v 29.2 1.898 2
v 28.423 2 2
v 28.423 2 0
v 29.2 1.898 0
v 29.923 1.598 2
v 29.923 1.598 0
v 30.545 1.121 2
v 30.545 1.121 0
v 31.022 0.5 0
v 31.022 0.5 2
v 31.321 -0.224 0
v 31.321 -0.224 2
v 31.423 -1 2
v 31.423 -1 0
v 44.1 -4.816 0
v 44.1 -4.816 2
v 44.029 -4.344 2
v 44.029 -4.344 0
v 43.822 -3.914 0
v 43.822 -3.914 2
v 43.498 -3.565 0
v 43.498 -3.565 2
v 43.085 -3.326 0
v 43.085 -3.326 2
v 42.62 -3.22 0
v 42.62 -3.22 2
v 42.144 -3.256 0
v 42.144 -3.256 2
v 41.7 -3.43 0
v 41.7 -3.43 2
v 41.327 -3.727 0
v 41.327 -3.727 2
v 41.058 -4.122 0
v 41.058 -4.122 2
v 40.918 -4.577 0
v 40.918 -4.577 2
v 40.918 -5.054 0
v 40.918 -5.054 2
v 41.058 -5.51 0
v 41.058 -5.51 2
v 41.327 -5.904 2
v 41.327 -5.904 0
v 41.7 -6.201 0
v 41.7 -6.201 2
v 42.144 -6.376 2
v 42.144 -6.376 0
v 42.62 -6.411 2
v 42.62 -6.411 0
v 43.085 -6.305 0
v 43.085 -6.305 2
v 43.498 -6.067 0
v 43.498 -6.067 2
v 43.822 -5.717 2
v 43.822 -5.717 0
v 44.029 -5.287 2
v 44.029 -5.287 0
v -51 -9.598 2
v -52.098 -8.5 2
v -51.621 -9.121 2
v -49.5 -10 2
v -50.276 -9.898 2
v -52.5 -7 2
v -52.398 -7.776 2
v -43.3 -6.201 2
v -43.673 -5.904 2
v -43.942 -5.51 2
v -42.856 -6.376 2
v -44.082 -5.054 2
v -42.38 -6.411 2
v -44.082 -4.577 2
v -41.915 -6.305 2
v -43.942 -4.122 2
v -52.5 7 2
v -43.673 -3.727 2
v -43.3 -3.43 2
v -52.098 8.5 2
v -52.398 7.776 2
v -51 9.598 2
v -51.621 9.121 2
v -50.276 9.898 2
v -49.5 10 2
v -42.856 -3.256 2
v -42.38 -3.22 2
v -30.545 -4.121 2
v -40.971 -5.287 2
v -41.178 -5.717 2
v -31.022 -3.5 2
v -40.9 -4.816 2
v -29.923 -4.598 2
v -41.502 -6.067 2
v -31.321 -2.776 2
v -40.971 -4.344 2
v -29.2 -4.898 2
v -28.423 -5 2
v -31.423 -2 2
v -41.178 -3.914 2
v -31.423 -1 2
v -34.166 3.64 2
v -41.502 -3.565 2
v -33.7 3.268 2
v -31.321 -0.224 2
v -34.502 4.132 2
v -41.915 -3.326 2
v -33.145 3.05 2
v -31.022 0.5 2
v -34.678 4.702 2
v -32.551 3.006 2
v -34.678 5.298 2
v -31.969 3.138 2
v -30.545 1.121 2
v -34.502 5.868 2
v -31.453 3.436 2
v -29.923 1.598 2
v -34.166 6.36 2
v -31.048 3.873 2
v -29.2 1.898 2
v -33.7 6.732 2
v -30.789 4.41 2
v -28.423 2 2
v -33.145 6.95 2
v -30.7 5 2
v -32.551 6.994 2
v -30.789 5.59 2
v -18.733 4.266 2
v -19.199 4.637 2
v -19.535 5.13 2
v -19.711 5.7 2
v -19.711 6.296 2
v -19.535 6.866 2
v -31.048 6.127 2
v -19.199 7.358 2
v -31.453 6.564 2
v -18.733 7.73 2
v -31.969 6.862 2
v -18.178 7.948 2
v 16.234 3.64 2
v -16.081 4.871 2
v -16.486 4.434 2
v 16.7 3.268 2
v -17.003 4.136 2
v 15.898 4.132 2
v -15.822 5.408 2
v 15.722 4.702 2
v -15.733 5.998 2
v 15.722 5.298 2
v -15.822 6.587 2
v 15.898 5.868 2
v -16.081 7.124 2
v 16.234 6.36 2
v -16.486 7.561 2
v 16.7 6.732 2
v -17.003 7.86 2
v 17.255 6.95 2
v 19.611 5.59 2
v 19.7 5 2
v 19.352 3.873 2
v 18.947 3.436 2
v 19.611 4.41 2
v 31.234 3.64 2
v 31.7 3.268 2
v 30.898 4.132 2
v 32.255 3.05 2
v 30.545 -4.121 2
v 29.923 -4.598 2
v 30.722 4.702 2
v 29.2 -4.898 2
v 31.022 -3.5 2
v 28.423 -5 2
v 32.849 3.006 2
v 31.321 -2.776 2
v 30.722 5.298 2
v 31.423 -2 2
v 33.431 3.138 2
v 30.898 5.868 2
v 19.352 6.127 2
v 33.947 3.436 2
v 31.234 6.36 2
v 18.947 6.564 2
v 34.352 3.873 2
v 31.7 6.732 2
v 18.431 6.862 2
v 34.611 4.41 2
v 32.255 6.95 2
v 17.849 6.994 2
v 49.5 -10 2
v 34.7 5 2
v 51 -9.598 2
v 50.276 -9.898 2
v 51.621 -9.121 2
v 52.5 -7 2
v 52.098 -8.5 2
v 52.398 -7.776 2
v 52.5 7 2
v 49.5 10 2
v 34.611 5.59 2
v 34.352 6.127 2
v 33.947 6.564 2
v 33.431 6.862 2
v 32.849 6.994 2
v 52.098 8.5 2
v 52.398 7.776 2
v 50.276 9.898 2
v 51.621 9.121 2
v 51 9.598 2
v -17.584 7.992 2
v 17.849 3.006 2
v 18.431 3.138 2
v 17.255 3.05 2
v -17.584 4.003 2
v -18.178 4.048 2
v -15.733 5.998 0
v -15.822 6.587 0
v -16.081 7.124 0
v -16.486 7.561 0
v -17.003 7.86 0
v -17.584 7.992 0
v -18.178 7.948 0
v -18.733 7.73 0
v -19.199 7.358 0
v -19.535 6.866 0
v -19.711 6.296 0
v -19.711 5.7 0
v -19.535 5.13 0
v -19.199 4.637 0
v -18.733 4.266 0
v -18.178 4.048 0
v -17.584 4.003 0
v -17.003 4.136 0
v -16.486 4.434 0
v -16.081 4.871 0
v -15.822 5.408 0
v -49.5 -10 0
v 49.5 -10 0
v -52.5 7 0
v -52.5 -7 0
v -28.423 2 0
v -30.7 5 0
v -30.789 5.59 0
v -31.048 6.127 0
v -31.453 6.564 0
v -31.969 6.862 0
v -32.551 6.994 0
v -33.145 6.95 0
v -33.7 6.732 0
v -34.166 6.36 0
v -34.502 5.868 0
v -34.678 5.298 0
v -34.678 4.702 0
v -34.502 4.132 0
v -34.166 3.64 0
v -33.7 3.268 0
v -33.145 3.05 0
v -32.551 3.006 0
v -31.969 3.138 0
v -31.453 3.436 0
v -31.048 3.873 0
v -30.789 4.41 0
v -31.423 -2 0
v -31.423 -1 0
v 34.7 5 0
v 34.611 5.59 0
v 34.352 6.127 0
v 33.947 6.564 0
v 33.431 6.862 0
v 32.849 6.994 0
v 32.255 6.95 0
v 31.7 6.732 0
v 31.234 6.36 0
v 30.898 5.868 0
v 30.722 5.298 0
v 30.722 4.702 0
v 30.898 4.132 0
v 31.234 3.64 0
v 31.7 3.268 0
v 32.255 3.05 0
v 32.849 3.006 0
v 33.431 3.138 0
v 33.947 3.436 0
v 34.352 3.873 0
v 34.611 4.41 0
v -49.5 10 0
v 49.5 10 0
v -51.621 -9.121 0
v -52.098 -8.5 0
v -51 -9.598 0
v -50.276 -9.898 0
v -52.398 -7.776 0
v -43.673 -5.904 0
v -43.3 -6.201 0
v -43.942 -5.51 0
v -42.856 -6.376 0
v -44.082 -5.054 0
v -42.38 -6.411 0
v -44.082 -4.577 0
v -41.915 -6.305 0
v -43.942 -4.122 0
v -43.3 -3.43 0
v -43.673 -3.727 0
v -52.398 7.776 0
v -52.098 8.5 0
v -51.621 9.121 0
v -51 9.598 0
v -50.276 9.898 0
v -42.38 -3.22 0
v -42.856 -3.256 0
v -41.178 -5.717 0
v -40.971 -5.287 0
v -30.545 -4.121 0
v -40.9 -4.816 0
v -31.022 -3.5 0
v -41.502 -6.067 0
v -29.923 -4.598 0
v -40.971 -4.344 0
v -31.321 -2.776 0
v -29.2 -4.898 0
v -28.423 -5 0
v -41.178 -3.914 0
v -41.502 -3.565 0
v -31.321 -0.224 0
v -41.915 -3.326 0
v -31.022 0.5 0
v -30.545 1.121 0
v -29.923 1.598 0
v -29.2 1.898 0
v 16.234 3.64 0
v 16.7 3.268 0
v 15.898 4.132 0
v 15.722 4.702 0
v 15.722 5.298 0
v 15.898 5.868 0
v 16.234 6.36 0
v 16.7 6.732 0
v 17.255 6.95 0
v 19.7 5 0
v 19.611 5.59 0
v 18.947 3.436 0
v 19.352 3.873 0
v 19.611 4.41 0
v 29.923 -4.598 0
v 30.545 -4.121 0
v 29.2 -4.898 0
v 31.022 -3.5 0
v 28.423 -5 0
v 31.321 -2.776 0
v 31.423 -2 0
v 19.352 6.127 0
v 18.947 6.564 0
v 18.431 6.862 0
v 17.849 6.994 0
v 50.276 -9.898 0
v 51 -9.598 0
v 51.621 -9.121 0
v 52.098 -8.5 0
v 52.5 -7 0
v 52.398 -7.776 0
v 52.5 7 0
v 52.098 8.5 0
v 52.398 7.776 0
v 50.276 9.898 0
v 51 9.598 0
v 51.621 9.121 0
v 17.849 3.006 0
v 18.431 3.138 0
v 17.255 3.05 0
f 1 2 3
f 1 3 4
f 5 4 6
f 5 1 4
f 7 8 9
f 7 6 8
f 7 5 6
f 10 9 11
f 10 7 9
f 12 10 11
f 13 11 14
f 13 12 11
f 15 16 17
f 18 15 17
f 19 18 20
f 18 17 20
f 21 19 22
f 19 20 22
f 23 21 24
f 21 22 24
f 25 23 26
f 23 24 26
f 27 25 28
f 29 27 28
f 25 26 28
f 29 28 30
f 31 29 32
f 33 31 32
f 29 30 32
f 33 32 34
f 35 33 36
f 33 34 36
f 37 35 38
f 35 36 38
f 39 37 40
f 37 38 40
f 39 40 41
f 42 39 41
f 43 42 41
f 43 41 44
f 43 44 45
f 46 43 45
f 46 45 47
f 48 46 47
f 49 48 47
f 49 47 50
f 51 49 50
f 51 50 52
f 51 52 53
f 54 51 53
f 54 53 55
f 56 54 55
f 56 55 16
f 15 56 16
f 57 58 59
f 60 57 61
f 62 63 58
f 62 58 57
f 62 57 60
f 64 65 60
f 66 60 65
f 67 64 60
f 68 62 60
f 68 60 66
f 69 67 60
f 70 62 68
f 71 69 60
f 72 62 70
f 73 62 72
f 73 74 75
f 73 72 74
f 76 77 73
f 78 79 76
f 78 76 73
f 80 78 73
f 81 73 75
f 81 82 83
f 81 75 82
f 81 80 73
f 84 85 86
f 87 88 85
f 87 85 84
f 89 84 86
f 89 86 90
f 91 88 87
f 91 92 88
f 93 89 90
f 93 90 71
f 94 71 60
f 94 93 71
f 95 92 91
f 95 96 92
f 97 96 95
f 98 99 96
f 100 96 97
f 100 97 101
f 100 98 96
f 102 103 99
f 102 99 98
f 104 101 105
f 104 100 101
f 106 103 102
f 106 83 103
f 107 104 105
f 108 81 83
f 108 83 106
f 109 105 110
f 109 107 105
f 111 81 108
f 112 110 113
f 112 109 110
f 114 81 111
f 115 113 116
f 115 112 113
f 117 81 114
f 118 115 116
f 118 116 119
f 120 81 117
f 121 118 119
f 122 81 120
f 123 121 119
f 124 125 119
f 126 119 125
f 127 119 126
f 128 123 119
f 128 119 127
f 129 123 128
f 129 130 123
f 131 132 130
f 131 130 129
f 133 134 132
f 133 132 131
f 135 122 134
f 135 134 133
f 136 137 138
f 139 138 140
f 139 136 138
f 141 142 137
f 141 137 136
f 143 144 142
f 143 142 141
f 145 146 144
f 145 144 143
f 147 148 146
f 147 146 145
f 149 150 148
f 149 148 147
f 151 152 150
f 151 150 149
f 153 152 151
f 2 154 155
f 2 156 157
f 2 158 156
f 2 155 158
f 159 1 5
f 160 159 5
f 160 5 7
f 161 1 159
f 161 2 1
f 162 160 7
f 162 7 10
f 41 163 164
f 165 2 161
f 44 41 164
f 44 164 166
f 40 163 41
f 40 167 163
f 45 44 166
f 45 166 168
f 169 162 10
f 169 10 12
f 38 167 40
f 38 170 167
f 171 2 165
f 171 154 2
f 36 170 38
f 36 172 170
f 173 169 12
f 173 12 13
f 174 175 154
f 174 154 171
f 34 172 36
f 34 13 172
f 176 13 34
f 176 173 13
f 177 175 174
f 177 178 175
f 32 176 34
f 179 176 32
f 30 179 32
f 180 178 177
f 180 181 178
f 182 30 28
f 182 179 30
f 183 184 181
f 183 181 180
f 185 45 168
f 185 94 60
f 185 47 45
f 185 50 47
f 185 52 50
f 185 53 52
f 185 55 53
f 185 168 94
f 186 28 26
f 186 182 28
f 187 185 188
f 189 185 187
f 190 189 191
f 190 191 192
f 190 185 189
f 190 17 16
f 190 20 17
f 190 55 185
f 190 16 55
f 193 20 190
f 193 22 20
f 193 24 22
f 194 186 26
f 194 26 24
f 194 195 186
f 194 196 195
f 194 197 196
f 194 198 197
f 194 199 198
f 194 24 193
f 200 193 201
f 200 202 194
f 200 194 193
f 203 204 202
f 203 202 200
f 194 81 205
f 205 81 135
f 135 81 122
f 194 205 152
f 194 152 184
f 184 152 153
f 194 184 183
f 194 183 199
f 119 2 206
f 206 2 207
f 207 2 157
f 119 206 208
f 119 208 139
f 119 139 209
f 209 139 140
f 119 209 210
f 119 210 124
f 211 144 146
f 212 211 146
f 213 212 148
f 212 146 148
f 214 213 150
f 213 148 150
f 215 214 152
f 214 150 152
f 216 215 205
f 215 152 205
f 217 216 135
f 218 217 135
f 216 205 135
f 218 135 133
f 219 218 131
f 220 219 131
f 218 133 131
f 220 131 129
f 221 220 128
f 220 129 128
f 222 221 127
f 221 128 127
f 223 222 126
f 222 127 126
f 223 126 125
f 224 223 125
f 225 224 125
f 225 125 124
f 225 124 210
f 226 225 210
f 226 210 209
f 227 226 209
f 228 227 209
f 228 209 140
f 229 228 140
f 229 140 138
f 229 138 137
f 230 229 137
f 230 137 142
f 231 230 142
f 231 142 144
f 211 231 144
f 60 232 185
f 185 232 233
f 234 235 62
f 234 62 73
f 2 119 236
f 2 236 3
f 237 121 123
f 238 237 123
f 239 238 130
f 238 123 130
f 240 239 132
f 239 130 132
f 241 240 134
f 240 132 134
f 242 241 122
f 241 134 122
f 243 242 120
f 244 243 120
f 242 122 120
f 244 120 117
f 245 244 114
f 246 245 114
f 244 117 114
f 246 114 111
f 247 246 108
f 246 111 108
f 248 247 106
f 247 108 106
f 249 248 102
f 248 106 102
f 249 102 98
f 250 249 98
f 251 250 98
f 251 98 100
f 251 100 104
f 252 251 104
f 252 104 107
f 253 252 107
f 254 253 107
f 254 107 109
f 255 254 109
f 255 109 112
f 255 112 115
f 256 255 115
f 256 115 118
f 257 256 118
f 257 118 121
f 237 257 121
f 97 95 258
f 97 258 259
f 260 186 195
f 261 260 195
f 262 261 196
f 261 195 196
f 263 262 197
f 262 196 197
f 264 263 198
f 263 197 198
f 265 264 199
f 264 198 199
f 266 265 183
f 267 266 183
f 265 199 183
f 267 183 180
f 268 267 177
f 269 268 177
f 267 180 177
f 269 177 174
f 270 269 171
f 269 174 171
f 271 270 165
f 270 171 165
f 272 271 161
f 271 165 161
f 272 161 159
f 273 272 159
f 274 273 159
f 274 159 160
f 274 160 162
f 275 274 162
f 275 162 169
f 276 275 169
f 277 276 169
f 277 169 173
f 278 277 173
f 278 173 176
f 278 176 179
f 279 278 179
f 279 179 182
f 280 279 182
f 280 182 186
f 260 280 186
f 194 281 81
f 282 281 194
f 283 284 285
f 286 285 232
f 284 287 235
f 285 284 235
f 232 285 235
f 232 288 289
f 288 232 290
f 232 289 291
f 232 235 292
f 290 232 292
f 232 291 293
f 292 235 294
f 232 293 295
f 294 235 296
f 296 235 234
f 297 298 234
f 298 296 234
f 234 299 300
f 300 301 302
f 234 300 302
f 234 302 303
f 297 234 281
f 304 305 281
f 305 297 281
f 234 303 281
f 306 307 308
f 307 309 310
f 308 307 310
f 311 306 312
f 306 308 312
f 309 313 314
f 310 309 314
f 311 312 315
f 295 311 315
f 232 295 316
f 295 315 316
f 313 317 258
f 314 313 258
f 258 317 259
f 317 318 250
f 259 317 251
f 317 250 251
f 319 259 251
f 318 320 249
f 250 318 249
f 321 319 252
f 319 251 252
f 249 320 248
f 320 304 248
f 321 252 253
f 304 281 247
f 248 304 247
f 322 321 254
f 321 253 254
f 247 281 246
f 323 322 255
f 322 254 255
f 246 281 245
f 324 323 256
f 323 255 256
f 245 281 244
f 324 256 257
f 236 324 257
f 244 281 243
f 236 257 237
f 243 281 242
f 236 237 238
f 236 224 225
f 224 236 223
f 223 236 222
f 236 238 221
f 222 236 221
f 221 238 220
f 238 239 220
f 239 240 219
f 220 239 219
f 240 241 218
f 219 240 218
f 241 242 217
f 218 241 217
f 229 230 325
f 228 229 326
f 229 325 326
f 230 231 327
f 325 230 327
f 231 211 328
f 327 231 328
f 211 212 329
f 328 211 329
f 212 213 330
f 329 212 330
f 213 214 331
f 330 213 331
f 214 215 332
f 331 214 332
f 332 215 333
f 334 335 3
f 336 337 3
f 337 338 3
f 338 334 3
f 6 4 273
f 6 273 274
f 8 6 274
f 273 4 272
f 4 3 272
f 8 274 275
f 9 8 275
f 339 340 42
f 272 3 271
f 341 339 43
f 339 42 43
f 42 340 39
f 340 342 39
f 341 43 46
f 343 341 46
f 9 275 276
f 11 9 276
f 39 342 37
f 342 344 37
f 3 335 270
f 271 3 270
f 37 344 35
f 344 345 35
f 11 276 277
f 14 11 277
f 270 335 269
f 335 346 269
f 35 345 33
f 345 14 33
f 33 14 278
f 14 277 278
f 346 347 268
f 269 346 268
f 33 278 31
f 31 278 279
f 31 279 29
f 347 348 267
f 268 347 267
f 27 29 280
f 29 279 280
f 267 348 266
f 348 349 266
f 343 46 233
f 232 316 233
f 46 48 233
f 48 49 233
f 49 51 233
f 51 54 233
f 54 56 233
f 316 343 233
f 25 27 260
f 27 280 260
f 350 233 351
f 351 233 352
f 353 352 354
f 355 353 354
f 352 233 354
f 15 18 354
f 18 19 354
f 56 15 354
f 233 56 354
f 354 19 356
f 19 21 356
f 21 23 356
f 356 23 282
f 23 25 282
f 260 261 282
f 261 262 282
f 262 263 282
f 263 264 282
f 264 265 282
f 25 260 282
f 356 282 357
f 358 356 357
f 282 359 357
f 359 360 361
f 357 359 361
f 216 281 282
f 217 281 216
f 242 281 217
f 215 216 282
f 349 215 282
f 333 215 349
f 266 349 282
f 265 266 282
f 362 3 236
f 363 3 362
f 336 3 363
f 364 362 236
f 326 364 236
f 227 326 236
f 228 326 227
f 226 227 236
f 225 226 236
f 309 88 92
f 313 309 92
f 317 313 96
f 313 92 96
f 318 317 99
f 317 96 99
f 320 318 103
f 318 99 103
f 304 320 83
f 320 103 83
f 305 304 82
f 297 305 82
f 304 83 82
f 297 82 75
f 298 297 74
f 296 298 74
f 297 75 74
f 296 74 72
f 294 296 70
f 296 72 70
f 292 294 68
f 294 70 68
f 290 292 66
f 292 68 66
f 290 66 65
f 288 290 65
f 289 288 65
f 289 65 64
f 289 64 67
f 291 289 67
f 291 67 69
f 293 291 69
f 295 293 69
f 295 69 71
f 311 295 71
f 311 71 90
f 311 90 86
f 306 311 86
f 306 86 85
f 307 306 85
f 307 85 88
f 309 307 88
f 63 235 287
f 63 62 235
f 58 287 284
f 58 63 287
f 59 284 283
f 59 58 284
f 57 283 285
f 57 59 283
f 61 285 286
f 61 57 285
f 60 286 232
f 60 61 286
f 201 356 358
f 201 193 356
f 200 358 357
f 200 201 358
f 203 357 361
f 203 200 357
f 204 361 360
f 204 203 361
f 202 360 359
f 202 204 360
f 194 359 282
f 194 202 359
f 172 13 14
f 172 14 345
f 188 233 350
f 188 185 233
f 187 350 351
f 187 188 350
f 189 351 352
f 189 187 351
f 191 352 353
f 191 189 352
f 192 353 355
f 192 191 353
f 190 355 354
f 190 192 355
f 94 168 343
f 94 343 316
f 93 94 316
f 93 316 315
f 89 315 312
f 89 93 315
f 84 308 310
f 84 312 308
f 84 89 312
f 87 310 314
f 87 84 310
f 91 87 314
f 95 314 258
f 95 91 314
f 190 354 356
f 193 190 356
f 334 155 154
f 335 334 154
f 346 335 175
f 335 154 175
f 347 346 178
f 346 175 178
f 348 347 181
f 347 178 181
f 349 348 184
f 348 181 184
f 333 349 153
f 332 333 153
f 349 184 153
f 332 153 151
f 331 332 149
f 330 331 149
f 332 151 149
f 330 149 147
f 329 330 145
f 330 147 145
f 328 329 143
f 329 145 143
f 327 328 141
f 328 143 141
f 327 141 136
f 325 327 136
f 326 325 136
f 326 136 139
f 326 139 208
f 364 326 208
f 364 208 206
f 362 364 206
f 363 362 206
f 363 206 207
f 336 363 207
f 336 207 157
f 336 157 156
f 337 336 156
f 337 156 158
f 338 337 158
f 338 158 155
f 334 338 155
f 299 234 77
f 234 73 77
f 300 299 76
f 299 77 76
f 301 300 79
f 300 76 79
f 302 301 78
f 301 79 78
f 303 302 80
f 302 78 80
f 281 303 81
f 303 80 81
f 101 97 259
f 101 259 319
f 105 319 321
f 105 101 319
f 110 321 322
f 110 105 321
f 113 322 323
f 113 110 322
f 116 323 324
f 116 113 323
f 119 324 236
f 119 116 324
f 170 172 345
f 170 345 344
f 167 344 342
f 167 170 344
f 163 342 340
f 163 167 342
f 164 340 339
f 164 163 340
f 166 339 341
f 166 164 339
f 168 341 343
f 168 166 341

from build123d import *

# Parameters (mm, degrees)
SKETCH_1_W          = 105
SKETCH_1_H          = 20
EXTRUDE_1_DEPTH     = 2
FILLET_1_R          = 3
SKETCH_2_R          = 2
SKETCH_2_R_2        = 1.6
CUT_EXTRUDE_1_DEPTH = 3


with BuildPart() as part:
    # 草图1 → 凸台-拉伸1 (new body)
    with BuildSketch(Plane.XY):
        Rectangle(SKETCH_1_W, SKETCH_1_H)
    extrude(amount=EXTRUDE_1_DEPTH)

    # 圆角1
    fillet_1_edges = [part.edges().sort_by_distance(p)[0] for p in [
        (52.5, -10, 1),
        (-52.5, -10, 1),
        (-52.5, 10, 1),
        (52.5, 10, 1),
    ]]
    fillet(fillet_1_edges, radius=FILLET_1_R)

    # 草图2 → 切除-拉伸1 (cut)
    with BuildSketch(Plane.XY.offset(2)):
        with Locations((-32.7, 5)):
            Circle(SKETCH_2_R)
        with Locations((-17.733222632, 5.997785158)):
            Circle(SKETCH_2_R)
        with Locations((17.7, 5)):
            Circle(SKETCH_2_R)
        with Locations((32.7, 5)):
            Circle(SKETCH_2_R)
        with Locations((42.5, -4.815743551)):
            Circle(SKETCH_2_R_2)
        with Locations((-42.5, -4.815743551)):
            Circle(SKETCH_2_R_2)
        with BuildLine():
            Line((-28.423476114, 2), (28.423476114, 2))
            ThreePointArc((28.423476114, 2), (30.544796458, 1.121320344), (31.423476114, -1))
            Line((31.423476114, -1), (31.423476114, -2))
            ThreePointArc((31.423476114, -2), (30.544796458, -4.121320344), (28.423476114, -5))
            Line((28.423476114, -5), (-28.423476114, -5))
            ThreePointArc((-28.423476114, -5), (-30.544796458, -4.121320344), (-31.423476114, -2))
            Line((-31.423476114, -2), (-31.423476114, -1))
            ThreePointArc((-31.423476114, -1), (-30.544796458, 1.121320344), (-28.423476114, 2))
        make_face()
    extrude(amount=-CUT_EXTRUDE_1_DEPTH, mode=Mode.SUBTRACT)


solid = part.part
